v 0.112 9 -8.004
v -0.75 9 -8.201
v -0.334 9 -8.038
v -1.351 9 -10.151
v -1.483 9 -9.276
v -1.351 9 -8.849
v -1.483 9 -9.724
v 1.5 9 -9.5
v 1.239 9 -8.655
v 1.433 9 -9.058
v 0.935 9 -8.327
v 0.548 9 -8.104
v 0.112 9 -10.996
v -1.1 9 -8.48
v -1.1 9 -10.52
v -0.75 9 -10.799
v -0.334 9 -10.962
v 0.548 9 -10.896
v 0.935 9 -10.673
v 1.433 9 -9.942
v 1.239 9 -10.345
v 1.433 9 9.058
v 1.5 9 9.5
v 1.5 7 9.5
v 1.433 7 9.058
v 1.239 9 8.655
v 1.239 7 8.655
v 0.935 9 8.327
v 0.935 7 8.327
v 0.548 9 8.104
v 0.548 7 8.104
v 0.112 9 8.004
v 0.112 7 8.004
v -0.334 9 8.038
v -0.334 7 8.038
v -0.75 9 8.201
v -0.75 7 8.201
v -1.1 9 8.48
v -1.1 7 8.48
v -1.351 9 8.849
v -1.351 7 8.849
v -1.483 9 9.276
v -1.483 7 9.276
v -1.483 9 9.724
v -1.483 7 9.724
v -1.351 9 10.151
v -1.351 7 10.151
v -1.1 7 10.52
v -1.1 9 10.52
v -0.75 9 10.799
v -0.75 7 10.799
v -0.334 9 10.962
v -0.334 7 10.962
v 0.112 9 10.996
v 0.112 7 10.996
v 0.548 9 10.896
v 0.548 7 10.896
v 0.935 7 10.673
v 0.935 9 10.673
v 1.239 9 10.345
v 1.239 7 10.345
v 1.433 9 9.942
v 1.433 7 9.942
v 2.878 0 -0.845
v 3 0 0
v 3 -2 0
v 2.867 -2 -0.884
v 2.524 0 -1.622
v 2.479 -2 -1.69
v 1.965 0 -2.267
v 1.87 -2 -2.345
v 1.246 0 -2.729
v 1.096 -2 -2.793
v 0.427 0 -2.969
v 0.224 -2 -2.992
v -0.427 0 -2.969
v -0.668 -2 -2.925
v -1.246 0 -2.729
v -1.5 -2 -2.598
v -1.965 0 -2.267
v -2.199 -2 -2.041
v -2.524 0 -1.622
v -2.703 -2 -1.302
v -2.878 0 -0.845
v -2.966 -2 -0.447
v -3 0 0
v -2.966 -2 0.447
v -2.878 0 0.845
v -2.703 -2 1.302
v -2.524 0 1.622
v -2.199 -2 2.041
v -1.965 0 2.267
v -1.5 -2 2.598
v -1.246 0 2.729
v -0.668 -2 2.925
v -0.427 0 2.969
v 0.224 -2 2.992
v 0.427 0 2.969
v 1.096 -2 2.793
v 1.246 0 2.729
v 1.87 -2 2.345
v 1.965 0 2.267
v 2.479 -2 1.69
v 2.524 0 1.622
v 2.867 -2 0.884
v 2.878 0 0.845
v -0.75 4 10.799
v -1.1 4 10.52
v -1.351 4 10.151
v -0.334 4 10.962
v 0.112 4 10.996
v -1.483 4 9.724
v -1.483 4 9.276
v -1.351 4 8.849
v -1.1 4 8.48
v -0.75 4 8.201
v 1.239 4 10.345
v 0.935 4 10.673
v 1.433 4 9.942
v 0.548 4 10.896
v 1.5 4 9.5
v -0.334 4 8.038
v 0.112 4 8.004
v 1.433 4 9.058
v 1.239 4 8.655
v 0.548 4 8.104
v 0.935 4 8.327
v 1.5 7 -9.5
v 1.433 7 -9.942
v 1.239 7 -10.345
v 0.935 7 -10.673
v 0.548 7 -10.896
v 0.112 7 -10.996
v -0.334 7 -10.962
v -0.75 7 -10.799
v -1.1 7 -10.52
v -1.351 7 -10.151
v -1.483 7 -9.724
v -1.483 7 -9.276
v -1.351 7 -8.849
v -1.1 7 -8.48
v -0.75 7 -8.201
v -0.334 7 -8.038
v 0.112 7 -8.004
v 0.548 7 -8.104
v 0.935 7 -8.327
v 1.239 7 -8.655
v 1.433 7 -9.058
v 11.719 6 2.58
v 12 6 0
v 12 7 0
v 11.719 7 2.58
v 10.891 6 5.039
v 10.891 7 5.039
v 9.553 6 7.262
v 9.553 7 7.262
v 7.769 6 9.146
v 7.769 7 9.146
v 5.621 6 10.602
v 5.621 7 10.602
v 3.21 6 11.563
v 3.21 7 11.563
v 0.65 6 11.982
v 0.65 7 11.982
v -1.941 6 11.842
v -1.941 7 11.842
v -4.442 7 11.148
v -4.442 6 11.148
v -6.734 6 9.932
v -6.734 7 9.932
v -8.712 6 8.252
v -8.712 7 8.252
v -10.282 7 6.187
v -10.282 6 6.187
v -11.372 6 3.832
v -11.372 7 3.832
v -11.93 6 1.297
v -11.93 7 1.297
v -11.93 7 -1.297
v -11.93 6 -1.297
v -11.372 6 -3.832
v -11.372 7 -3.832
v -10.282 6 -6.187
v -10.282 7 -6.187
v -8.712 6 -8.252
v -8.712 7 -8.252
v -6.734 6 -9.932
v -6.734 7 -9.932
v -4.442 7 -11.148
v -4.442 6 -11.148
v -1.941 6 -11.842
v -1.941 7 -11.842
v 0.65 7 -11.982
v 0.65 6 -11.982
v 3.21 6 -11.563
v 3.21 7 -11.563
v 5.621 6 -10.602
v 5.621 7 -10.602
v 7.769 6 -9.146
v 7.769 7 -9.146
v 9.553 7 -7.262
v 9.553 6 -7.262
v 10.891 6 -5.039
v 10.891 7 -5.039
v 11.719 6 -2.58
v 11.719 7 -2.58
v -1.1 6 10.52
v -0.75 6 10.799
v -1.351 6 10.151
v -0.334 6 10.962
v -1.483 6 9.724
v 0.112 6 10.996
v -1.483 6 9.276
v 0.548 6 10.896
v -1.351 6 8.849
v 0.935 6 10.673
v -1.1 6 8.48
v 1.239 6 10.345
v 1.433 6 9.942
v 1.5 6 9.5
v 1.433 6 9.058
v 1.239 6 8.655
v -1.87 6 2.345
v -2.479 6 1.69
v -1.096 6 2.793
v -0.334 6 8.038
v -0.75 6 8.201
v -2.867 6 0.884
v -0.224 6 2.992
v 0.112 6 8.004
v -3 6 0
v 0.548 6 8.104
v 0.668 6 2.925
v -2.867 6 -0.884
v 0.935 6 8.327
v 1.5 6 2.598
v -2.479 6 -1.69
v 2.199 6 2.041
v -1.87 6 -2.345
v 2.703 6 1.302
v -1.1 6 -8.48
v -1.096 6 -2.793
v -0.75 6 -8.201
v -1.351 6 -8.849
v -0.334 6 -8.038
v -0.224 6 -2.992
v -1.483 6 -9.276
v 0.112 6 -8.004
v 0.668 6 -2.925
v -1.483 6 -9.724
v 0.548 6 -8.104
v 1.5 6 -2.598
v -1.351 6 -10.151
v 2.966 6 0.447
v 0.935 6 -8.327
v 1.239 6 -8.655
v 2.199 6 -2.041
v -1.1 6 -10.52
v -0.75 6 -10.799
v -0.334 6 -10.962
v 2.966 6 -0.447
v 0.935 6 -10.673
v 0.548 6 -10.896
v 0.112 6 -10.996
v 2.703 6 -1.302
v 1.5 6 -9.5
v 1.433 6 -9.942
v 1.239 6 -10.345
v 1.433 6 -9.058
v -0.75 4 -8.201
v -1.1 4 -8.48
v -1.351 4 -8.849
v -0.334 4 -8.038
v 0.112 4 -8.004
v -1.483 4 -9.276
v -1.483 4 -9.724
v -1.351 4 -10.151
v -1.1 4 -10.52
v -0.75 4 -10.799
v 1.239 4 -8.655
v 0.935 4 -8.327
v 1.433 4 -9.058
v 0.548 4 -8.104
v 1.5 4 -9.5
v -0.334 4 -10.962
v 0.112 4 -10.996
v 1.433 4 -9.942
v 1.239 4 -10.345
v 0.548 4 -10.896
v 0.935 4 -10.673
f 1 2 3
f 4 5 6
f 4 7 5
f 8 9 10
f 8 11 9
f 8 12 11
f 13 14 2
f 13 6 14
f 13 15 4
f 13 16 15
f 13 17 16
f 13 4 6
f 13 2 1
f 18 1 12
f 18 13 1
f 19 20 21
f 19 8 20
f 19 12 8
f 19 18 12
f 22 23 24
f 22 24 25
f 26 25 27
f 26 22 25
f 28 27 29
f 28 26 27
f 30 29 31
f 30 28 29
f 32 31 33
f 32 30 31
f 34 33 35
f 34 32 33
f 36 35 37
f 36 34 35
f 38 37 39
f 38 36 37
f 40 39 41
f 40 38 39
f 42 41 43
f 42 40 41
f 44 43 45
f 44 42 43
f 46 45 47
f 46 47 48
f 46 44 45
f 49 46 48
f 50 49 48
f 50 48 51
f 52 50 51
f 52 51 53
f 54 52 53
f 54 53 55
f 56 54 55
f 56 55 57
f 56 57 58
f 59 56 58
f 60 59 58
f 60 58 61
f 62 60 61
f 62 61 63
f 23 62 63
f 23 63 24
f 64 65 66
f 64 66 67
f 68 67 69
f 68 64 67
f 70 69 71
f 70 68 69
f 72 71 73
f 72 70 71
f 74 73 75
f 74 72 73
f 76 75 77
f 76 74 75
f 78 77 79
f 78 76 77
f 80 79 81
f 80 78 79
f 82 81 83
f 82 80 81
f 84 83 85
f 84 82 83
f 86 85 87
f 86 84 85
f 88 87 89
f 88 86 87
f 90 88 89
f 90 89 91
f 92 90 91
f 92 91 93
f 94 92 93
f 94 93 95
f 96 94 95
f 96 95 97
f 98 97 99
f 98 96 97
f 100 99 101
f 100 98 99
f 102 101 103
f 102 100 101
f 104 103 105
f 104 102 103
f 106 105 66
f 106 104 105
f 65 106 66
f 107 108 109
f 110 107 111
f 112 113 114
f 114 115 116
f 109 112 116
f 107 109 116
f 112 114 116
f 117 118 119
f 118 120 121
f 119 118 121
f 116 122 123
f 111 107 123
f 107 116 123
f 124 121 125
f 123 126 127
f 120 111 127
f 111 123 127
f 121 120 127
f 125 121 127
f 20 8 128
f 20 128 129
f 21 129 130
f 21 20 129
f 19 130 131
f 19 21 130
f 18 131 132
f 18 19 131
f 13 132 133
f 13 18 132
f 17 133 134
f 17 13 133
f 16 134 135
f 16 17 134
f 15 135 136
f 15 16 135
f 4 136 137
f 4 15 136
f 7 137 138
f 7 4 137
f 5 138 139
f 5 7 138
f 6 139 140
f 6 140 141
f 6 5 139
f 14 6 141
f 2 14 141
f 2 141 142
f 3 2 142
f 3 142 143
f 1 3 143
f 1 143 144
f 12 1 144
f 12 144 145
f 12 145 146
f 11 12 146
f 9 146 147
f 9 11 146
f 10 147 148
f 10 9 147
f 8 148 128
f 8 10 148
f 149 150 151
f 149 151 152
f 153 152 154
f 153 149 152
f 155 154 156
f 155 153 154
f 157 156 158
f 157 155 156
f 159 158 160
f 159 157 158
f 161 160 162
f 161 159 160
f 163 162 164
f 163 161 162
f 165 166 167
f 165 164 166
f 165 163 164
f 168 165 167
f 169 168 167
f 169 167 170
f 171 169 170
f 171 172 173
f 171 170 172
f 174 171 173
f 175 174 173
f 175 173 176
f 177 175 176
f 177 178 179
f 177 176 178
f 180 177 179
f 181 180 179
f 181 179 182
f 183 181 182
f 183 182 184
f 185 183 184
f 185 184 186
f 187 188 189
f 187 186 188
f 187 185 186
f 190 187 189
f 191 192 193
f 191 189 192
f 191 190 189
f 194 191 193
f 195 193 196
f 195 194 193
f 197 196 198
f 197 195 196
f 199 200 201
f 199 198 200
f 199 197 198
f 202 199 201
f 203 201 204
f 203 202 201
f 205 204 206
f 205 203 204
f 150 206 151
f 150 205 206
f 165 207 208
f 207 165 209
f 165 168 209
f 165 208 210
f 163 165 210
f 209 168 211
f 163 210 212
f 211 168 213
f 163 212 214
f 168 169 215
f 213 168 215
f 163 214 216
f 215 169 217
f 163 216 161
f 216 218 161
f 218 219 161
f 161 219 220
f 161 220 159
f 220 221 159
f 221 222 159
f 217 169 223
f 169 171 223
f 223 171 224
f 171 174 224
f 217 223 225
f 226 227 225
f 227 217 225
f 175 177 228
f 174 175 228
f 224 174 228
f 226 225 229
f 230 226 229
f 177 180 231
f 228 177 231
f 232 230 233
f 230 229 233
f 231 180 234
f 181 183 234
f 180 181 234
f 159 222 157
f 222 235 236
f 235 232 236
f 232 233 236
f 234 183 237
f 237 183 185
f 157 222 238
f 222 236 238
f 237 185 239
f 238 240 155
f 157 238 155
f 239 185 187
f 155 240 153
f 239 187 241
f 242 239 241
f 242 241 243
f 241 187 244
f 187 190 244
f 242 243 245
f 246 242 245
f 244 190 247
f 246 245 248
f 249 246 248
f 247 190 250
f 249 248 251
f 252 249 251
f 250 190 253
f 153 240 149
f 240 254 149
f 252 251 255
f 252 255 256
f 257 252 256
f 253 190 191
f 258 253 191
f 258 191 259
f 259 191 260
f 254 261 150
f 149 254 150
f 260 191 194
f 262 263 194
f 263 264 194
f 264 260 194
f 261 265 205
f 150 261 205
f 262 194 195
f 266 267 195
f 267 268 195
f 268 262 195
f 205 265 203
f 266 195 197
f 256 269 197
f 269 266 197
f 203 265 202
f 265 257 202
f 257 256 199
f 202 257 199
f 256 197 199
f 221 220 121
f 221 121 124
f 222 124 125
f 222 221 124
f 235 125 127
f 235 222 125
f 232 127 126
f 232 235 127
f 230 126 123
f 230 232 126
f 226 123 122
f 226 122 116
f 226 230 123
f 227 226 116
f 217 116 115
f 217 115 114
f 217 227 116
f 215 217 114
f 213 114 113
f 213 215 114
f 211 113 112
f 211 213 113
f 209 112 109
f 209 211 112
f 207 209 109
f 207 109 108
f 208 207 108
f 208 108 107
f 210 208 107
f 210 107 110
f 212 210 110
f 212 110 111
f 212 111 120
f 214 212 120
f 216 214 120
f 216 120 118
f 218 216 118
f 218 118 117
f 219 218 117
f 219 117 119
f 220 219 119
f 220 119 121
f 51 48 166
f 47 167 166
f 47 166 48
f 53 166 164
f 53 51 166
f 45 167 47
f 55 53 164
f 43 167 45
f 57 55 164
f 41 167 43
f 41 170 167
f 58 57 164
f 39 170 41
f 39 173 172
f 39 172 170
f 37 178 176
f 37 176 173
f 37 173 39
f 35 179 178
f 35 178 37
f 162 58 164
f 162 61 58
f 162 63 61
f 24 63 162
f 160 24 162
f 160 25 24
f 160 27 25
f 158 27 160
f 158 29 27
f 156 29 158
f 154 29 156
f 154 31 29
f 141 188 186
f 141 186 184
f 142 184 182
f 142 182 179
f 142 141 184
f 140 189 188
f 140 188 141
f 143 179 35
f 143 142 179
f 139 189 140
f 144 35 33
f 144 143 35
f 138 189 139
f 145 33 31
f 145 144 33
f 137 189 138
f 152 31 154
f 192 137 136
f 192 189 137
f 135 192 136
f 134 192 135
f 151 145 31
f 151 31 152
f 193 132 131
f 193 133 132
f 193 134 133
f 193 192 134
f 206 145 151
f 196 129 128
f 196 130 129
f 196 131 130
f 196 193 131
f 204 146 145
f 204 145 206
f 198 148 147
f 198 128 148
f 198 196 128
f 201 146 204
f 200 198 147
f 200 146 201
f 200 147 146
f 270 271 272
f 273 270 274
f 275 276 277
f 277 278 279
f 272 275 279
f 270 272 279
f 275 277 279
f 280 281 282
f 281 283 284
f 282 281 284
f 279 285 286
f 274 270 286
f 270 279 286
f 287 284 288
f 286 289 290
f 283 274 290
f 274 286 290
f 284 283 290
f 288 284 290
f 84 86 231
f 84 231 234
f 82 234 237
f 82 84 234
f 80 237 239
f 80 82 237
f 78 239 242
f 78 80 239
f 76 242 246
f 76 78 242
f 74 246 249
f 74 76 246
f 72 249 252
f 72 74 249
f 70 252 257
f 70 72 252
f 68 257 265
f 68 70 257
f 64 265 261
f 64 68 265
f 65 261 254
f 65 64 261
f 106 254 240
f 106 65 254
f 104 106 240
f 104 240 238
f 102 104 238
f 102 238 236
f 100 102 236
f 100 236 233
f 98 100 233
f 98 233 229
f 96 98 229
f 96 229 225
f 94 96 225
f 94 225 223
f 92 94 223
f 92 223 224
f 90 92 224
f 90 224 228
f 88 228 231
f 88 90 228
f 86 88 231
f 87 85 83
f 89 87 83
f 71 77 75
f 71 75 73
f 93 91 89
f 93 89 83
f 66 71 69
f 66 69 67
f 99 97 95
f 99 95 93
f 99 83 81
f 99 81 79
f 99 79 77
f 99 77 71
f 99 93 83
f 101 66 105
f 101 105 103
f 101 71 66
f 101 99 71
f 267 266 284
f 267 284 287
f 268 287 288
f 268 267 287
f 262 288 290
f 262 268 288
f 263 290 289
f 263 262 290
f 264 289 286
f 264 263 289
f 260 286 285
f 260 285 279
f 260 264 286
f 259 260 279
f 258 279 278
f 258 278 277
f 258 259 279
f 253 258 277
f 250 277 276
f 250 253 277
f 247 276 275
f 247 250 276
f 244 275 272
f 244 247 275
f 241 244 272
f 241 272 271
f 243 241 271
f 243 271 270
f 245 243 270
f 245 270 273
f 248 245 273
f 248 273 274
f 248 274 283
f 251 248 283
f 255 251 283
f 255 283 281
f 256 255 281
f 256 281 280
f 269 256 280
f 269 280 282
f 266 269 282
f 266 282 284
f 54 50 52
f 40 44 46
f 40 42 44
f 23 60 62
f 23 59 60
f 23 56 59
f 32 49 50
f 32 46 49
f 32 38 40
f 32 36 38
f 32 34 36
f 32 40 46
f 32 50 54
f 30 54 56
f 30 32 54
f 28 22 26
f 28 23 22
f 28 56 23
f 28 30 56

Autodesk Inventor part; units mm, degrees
ref_plane "YZ Plane" through (0, 0, 0) normal (1, 0, 0) x (0, 1, 0)
ref_plane "XZ Plane" through (0, 0, 0) normal (0, 1, 0) x (-1, 0, 0)
ref_plane "XY Plane" through (0, 0, 0) normal (0, 0, 1) x (1, 0, 0)
sketch "Sketch1" plane through (0, 0, 0) normal (0, 1, 0) x (-1, 0, 0)
  circle A0 centre (0, 0) radius 3
  dimension "d0" = 6
extrude "Extrusion1" add sketch "Sketch1" along normal blind 6
sketch "Sketch2" plane through (0, 6, 0) normal (0, 1, 0) x (1, 0, 0)
  circle A0 centre (0, 0) radius 3 projected
  circle A1 centre (0, 0) radius 12
  dimension "d3" = 24
extrude "Extrusion2" add sketch "Sketch2" along normal blind 1 contours A0 | A1
sketch "Sketch3" plane through (0, 7, 0) normal (0, 1, 0) x (1, 0, 0)
  circle A0 centre (0, 0) radius 12 projected
  line L0 (0, 0) -> (0, -9.5)
  line L1 (0, -9.5) -> (0, 9.5)
  circle A1 centre (0, -9.5) radius 1.5
  circle A2 centre (0, 9.5) radius 1.5
  dimension "d6" = 9.5
  dimension "d7" = 19
  dimension "d8" = 3
  dimension "d9" = 3
extrude "Extrusion3" add sketch "Sketch3" along normal blind 2 and the other way blind 3 contours A1 | A2
sketch "Sketch4" plane through (0, 0, 0) normal (0, -1, 0) x (1, 0, 0)
  circle A0 centre (0, 0) radius 3 projected
extrude "Extrusion4" add sketch "Sketch4" along normal blind 2
properties part number "EE Wheel"
